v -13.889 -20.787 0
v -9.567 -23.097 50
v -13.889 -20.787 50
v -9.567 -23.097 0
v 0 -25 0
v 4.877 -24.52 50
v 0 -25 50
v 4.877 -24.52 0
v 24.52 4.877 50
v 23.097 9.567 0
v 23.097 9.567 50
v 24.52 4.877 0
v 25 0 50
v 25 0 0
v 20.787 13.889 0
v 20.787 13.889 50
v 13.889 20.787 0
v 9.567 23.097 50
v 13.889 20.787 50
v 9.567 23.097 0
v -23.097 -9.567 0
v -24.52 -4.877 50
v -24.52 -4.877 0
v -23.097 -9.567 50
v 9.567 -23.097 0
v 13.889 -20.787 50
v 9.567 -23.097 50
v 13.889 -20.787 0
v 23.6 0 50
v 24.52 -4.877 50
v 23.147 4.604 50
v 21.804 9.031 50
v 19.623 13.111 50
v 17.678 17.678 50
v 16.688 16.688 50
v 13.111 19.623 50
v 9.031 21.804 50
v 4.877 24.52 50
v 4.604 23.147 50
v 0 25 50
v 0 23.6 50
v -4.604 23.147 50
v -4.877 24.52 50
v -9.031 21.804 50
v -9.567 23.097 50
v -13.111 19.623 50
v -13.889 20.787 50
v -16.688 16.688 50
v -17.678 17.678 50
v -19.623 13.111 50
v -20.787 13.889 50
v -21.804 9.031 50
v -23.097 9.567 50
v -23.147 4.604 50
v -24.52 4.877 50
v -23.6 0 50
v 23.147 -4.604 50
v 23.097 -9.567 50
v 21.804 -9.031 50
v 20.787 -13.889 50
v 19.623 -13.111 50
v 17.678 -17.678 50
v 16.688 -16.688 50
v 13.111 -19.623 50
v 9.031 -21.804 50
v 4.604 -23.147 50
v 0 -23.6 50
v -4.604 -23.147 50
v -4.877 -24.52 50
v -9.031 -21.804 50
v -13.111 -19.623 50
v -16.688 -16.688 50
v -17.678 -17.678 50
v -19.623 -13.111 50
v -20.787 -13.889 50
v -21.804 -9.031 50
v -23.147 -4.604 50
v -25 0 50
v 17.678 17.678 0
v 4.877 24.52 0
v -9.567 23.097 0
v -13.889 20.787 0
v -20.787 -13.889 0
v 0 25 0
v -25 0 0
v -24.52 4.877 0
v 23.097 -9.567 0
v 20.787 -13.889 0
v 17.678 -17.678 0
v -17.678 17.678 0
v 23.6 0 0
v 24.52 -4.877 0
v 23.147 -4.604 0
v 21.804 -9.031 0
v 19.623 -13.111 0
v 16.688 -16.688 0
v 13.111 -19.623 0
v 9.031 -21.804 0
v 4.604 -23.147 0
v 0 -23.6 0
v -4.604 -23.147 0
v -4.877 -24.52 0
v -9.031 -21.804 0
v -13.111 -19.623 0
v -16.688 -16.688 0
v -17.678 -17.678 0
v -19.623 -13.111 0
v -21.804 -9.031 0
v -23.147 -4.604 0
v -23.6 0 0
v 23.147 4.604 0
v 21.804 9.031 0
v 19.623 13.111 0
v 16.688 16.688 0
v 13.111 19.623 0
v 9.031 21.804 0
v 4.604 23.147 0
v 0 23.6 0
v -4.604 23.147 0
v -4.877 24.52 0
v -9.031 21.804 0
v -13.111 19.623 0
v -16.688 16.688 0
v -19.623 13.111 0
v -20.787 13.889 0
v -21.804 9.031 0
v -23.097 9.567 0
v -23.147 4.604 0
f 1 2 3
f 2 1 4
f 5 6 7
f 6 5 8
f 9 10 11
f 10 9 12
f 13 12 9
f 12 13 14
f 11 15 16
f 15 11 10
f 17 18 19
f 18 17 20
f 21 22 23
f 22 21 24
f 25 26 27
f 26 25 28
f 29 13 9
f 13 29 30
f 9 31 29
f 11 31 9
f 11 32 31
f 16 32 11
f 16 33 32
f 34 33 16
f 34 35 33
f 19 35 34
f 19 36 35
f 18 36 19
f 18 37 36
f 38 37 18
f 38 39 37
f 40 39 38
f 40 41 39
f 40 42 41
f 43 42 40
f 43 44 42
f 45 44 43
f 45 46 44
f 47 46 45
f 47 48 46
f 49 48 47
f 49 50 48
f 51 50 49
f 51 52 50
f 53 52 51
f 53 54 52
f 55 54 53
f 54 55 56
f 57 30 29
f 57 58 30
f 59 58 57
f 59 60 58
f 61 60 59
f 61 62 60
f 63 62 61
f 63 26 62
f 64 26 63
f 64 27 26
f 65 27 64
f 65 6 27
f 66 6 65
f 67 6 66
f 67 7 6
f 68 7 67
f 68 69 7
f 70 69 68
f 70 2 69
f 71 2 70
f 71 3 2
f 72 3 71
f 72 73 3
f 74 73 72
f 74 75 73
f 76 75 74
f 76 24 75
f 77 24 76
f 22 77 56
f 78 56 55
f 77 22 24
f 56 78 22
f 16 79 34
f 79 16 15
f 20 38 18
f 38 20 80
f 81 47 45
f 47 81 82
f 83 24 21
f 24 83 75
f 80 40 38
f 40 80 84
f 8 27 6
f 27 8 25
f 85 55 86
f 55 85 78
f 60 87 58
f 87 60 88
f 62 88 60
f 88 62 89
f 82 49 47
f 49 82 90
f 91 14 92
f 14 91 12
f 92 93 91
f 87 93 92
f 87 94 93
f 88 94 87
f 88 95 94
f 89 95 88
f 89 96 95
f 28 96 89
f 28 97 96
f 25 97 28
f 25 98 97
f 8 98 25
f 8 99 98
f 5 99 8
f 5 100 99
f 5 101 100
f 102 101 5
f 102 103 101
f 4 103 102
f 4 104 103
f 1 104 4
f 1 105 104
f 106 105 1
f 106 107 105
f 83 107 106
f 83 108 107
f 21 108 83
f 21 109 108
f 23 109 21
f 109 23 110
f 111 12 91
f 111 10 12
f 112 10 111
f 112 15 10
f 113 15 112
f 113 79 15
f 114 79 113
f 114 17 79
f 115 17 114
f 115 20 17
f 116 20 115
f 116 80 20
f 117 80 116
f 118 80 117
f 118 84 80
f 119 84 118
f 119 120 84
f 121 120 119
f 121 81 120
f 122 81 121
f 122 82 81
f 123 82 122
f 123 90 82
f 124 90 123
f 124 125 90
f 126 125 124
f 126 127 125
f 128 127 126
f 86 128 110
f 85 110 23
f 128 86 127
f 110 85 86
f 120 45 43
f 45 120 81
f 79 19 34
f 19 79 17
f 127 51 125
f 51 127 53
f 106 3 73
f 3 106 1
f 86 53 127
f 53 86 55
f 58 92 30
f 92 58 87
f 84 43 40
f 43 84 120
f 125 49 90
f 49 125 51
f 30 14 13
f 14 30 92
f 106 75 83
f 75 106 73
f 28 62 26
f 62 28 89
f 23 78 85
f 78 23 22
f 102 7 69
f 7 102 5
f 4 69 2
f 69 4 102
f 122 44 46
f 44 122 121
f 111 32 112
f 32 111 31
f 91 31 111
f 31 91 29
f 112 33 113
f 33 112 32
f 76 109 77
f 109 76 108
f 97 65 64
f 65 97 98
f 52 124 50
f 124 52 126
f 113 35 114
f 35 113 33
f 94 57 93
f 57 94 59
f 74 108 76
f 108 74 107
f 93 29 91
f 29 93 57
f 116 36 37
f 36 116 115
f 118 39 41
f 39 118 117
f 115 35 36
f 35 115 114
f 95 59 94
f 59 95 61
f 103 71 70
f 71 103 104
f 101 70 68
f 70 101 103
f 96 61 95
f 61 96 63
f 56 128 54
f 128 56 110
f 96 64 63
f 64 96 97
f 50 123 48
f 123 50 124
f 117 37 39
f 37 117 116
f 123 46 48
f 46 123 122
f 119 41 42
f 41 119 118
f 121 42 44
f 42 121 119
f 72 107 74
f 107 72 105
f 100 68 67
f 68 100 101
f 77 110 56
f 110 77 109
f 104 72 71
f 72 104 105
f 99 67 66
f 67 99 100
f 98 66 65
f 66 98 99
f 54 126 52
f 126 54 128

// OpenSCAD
$fn = 32;

// ----------------------------------------------------------------------
// Thin tube: 1.4 mm wall
// ----------------------------------------------------------------------

// --- parameters (mm) ---
tube_od = 50;             // outer diameter
tube_h = 50;              // height, Z
wall = 1.4;               // wall thickness

difference() {
  cylinder(h = tube_h, d = tube_od);
  translate([0, 0, -1]) cylinder(h = tube_h + 2, d = tube_od - 2 * wall);
}
